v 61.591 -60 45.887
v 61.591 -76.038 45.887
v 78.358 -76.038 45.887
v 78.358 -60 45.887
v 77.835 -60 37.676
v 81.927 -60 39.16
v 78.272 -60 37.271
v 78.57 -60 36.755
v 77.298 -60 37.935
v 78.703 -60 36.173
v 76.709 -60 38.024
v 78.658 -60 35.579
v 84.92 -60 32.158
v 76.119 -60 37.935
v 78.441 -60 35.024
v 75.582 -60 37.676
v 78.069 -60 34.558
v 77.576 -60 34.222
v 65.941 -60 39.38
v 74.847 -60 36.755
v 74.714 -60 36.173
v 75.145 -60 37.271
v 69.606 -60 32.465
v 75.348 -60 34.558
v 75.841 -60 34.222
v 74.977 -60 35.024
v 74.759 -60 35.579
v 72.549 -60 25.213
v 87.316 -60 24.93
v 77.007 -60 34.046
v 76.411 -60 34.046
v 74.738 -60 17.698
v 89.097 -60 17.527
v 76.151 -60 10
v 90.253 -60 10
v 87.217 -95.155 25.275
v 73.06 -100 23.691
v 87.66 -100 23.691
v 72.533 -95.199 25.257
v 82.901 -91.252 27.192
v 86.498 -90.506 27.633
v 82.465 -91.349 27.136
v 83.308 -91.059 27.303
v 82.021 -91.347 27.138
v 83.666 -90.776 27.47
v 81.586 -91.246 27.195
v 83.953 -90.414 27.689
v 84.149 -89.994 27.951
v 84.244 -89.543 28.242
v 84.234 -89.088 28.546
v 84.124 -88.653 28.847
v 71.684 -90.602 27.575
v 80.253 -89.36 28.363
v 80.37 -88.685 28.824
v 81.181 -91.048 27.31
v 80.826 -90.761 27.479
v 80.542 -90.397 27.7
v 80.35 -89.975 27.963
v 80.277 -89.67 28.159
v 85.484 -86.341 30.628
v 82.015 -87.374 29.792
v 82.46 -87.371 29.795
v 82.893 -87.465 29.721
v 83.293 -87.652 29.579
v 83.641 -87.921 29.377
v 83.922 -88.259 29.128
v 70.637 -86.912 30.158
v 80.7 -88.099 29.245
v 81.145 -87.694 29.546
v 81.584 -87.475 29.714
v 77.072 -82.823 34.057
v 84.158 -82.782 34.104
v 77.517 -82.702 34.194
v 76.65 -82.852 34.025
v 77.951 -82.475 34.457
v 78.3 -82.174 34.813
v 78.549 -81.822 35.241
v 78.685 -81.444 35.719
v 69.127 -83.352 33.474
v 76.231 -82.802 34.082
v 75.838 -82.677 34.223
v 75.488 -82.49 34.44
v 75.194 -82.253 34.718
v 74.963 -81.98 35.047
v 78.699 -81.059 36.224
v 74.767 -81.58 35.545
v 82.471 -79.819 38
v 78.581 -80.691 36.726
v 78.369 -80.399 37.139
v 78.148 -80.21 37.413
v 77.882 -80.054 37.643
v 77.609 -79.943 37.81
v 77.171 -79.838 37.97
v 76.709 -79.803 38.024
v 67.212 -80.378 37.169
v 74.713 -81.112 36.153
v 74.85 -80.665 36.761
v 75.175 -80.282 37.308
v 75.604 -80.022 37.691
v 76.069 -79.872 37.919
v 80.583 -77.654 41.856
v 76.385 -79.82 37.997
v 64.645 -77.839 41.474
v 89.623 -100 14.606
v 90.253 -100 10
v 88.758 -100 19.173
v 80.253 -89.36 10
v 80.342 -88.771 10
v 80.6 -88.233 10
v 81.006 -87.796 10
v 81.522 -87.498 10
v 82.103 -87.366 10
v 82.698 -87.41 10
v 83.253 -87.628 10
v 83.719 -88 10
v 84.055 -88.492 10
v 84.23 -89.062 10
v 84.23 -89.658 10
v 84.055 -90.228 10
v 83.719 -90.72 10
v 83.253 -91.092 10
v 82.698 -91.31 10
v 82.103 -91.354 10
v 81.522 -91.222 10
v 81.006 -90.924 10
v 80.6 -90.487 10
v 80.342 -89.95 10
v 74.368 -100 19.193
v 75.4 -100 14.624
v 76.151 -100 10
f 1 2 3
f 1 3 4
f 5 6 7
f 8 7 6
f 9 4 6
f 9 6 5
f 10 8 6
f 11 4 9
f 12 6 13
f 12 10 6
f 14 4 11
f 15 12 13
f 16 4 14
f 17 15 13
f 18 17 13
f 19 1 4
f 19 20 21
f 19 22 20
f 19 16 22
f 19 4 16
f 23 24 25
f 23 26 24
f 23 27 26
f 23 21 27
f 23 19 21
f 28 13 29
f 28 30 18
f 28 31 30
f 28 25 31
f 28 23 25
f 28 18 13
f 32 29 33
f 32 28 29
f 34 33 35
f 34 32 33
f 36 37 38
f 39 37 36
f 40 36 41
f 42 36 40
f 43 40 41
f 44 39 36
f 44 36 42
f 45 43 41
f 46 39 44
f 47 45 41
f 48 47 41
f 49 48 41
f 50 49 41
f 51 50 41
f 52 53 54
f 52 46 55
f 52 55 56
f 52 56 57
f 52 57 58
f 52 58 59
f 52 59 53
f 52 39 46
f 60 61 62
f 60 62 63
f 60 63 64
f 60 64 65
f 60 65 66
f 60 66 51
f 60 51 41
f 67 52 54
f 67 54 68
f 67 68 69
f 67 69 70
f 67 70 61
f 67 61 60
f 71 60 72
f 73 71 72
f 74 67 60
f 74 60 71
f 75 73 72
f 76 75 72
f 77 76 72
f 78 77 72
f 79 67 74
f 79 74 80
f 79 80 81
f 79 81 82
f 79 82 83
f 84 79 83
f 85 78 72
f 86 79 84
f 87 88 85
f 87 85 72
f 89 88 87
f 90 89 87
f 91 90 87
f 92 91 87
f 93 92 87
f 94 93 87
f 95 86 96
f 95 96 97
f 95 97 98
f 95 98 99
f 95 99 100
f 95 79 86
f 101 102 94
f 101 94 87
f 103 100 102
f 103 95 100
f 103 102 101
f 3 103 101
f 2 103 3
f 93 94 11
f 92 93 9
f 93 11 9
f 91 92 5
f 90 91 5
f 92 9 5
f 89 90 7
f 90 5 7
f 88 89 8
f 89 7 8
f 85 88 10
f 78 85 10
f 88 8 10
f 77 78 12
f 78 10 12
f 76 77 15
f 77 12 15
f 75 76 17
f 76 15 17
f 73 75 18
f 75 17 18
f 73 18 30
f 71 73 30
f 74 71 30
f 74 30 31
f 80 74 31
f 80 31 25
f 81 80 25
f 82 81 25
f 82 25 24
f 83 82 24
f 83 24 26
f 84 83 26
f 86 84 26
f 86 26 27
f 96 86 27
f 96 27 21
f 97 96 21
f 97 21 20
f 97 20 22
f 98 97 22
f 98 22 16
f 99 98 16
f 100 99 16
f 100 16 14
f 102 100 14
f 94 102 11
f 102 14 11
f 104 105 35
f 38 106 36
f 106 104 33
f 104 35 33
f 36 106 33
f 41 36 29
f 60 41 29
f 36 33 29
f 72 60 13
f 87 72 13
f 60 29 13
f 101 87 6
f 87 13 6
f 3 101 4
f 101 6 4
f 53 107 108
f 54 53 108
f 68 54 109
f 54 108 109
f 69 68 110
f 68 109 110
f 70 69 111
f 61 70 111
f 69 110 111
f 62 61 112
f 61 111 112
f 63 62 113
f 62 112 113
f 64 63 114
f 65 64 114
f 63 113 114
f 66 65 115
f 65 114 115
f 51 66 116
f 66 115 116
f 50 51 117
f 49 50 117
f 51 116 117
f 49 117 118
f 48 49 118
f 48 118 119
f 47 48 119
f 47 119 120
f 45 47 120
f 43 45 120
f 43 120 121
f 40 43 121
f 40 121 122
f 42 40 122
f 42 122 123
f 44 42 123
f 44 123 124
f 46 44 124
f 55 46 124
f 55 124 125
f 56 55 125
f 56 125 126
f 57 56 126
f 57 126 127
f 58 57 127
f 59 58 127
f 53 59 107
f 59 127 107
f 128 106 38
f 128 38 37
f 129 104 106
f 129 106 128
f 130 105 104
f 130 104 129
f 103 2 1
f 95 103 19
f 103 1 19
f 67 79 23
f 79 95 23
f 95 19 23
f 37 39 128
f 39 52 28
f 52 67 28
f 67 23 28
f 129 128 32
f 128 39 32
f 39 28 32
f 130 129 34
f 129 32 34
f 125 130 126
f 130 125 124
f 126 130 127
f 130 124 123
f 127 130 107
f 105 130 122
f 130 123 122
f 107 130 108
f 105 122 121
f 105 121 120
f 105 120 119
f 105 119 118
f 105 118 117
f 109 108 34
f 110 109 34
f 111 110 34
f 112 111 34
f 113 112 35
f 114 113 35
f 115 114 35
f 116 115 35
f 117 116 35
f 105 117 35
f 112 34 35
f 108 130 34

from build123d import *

# Parameters (mm, degrees)
BOSS_EXTRUDE1_DEPTH      = 60
SKETCH25_W               = 5.5
SKETCH25_H               = 17
BOSS_EXTRUDE3_DEPTH      = 20
FILLET1_R                = 2.3
SKETCH28_W               = 8
SKETCH28_H               = 10
CUT_EXTRUDE17_DEPTH      = 265
CUT_EXTRUDE19_DEPTH      = 165.638713704
CUT_EXTRUDE19_DEPTH_BACK = 165.638713704
SKETCH30_W               = 183.61
SKETCH30_H               = 30
CUT_EXTRUDE20_DEPTH      = 165.638713704
CUT_EXTRUDE20_DEPTH_BACK = 165.638713704
SKETCH32_W               = 3
SKETCH32_H               = 14
BOSS_EXTRUDE4_DEPTH      = 40
CUT_EXTRUDE21_DEPTH      = 164.320868385
CUT_EXTRUDE21_DEPTH_BACK = 164.320868385
CUT_EXTRUDE22_DEPTH      = 164.320868502
CUT_EXTRUDE22_DEPTH_BACK = 164.320868502
SKETCH40_W               = 31.800896411
SKETCH40_H               = 59.801829262
CUT_EXTRUDE23_DEPTH      = 55
SKETCH41_R               = 2
CUT_EXTRUDE24_DEPTH      = 55
SKETCH42_R               = 2
CUT_EXTRUDE25_DEPTH      = 55


with BuildPart() as part:
    # Sketch1 → Boss-Extrude1 (new body)
    with BuildSketch(Plane(origin=(0, 0, 0), x_dir=(1, 0, 0), z_dir=(0, 1, 0))):
        with BuildLine():
            Line((91.805, -10), (90.252689849, -10))
            ThreePointArc((90.252689849, -10), (0, -90.805), (-90.252689849, -10))
            Line((-90.252689849, -10), (-91.805, -10))
            Line((-91.805, -10), (-91.805, 20))
            Line((-91.805, 20), (-76.805, 20))
            Line((-76.805, 20), (-76.805, 0))
            ThreePointArc((-76.805, 0), (0, -76.805), (76.805, 0))
            Line((76.805, 0), (76.805, 20))
            Line((76.805, 20), (91.805, 20))
            Line((91.805, 20), (91.805, -10))
        make_face()
    extrude(amount=-BOSS_EXTRUDE1_DEPTH)

    # Sketch25 → Boss-Extrude3 (add)
    with BuildSketch(Plane(origin=(0, -60, 0), x_dir=(-1, 0, 0), z_dir=(0, -1, 0))):
        with Locations((84.305, 5)):
            Rectangle(SKETCH25_W, SKETCH25_H)
        with Locations((-84.305, 5)):
            Rectangle(SKETCH25_W, SKETCH25_H)
    extrude(amount=BOSS_EXTRUDE3_DEPTH)

    # Fillet1
    fillet1_edges = [part.edges().sort_by_distance(p)[0] for p in [
        (84.305, -60, 3.5),
        (81.555, -60, -5),
        (87.055, -60, -5),
        (84.305, -60, -13.5),
        (-84.305, -60, 3.5),
        (-87.055, -60, -5),
        (-81.555, -60, -5),
        (-84.305, -60, -13.5),
    ]]
    fillet(fillet1_edges, radius=FILLET1_R)

    # Sketch28 → Cut-Extrude17 (cut)
    with BuildSketch(Plane(origin=(91.805, 0, 0), x_dir=(0, 0, -1), z_dir=(1, 0, 0))):
        with Locations((5, -42)):
            Rectangle(SKETCH28_W, SKETCH28_H)
    extrude(amount=-CUT_EXTRUDE17_DEPTH, mode=Mode.SUBTRACT)

    # Sketch30 → Cut-Extrude19 (cut, two sides: drawn at the far end of the back side and taken through both)
    with BuildSketch(Plane(origin=(0, 0, -20), x_dir=(-1, 0, 0), z_dir=(0, 0, -1)).offset(-CUT_EXTRUDE19_DEPTH_BACK)):
        with Locations((0, -15)):
            Rectangle(SKETCH30_W, SKETCH30_H)
    extrude(amount=CUT_EXTRUDE19_DEPTH + CUT_EXTRUDE19_DEPTH_BACK, mode=Mode.SUBTRACT)

    # Sketch32 → Cut-Extrude20 (cut, two sides: drawn at the far end of the back side and taken through both)
    with BuildSketch(Plane(origin=(0, 0, -20), x_dir=(-1, 0, 0), z_dir=(0, 0, -1)).offset(-CUT_EXTRUDE20_DEPTH_BACK)):
        with Locations((-65.13523483, -44)):
            Rectangle(SKETCH32_W, SKETCH32_H)
        with Locations((-51.773928511, -44)):
            Rectangle(SKETCH32_W, SKETCH32_H)
        with Locations((-84.305, -46)):
            Rectangle(SKETCH32_W, SKETCH32_H)
        with Locations((65.13523483, -44)):
            Rectangle(SKETCH32_W, SKETCH32_H)
        with Locations((51.773928511, -44)):
            Rectangle(SKETCH32_W, SKETCH32_H)
        with Locations((84.305, -46)):
            Rectangle(SKETCH32_W, SKETCH32_H)
    extrude(amount=CUT_EXTRUDE20_DEPTH + CUT_EXTRUDE20_DEPTH_BACK, mode=Mode.SUBTRACT)

    # Sketch33 → Boss-Extrude4 (add)
    with BuildSketch(Plane(origin=(0, -60, 0), x_dir=(-1, 0, 0), z_dir=(0, -1, 0))):
        with BuildLine():
            ThreePointArc((-90.252689849, -10), (-84.815671791, -32.432234638), (-73.898492454, -52.768938193))
            Line((-73.898492454, -52.768938193), (-61.590580503, -45.886909008))
            ThreePointArc((-61.590580503, -45.886909008), (-71.169996018, -28.876282513), (-76.151218145, -10))
            Line((-76.151218145, -10), (-90.252689849, -10))
        make_face()
        with BuildLine():
            ThreePointArc((73.898492454, -52.768938193), (84.815671791, -32.432234638), (90.252689849, -10))
            Line((90.252689849, -10), (76.151218145, -10))
            ThreePointArc((76.151218145, -10), (71.169996018, -28.876282513), (61.590580503, -45.886909008))
            Line((61.590580503, -45.886909008), (73.898492454, -52.768938193))
        make_face()
    extrude(amount=BOSS_EXTRUDE4_DEPTH)

    # Sketch37 → Cut-Extrude21 (cut, two sides: drawn at the far end of the back side and taken through both)
    with BuildSketch(Plane(origin=(0, 0, 0), x_dir=(0, 0, -1), z_dir=(1, 0, 0)).offset(-CUT_EXTRUDE21_DEPTH_BACK)):
        with BuildLine():
            Line((-0.881303102, -100), (-23.690614963, -100))
            ThreePointArc((-23.690614963, -100), (-31.684760451, -85.14357588), (-45.886909008, -76.037606625))
            Line((-45.886909008, -76.037606625), (-45.886909008, -59.917167305))
            Line((-45.886909008, -59.917167305), (-66.948234535, -59.917167305))
            Line((-66.948234535, -59.917167305), (-63.746381293, -92.441906362))
            Line((-63.746381293, -92.441906362), (-47.571757556, -115.346464391))
            Line((-47.571757556, -115.346464391), (-8.086377987, -115.346464391))
            Line((-8.086377987, -115.346464391), (-0.881303102, -100))
        make_face()
    extrude(amount=CUT_EXTRUDE21_DEPTH + CUT_EXTRUDE21_DEPTH_BACK, mode=Mode.SUBTRACT)

    # Sketch38 → Cut-Extrude22 (cut, two sides: drawn at the far end of the back side and taken through both)
    with BuildSketch(Plane(origin=(0, 0, 0), x_dir=(0, 0, -1), z_dir=(1, 0, 0)).offset(-CUT_EXTRUDE22_DEPTH_BACK)):
        Polygon((20, -30), (-90.805, -30), (-90.805, -60), (-10, -60), (-10, -100), (20, -100), (20, -60), align=None)
    extrude(amount=CUT_EXTRUDE22_DEPTH + CUT_EXTRUDE22_DEPTH_BACK, mode=Mode.SUBTRACT)


with BuildPart() as cut_extrude22_piece_1:
    # of the separate pieces the step leaves, piece 1, a body of its own (cut_extrude22_pieces)
    add(part.part.solids().sort_by_distance((76.151218145, -60, 10))[0])

    # Sketch41 → Cut-Extrude24 (cut)
    with BuildSketch(Plane(origin=(0, 0, 10), x_dir=(-1, 0, 0), z_dir=(0, 0, -1))):
        with Locations((-82.252689849, -89.36002802)):
            Circle(SKETCH41_R)
    extrude(amount=-CUT_EXTRUDE24_DEPTH, mode=Mode.SUBTRACT)

    # Sketch42 → Cut-Extrude25 (cut)
    with BuildSketch(Plane(origin=(0, -60, 0), x_dir=(1, 0, 0), z_dir=(0, 1, 0))):
        with Locations(Location((76.708608453, -36.023832562, 0), (0, 0, 270))):
            Circle(SKETCH42_R)
    extrude(amount=-CUT_EXTRUDE25_DEPTH, mode=Mode.SUBTRACT)


with BuildPart() as cut_extrude22_piece_2:
    # of the separate pieces the step leaves, piece 2, a body of its own (cut_extrude22_pieces)
    add(part.part.solids().sort_by_distance((-76.151218145, -60, 10))[0])

    # Sketch40 → Cut-Extrude23 (cut)
    with BuildSketch(Plane(origin=(0, -100, 0), x_dir=(-1, 0, 0), z_dir=(0, -1, 0))):
        with Locations((74.352241644, -39.900914631)):
            Rectangle(SKETCH40_W, SKETCH40_H)
    extrude(amount=-CUT_EXTRUDE23_DEPTH, mode=Mode.SUBTRACT)


solid = cut_extrude22_piece_1.part
